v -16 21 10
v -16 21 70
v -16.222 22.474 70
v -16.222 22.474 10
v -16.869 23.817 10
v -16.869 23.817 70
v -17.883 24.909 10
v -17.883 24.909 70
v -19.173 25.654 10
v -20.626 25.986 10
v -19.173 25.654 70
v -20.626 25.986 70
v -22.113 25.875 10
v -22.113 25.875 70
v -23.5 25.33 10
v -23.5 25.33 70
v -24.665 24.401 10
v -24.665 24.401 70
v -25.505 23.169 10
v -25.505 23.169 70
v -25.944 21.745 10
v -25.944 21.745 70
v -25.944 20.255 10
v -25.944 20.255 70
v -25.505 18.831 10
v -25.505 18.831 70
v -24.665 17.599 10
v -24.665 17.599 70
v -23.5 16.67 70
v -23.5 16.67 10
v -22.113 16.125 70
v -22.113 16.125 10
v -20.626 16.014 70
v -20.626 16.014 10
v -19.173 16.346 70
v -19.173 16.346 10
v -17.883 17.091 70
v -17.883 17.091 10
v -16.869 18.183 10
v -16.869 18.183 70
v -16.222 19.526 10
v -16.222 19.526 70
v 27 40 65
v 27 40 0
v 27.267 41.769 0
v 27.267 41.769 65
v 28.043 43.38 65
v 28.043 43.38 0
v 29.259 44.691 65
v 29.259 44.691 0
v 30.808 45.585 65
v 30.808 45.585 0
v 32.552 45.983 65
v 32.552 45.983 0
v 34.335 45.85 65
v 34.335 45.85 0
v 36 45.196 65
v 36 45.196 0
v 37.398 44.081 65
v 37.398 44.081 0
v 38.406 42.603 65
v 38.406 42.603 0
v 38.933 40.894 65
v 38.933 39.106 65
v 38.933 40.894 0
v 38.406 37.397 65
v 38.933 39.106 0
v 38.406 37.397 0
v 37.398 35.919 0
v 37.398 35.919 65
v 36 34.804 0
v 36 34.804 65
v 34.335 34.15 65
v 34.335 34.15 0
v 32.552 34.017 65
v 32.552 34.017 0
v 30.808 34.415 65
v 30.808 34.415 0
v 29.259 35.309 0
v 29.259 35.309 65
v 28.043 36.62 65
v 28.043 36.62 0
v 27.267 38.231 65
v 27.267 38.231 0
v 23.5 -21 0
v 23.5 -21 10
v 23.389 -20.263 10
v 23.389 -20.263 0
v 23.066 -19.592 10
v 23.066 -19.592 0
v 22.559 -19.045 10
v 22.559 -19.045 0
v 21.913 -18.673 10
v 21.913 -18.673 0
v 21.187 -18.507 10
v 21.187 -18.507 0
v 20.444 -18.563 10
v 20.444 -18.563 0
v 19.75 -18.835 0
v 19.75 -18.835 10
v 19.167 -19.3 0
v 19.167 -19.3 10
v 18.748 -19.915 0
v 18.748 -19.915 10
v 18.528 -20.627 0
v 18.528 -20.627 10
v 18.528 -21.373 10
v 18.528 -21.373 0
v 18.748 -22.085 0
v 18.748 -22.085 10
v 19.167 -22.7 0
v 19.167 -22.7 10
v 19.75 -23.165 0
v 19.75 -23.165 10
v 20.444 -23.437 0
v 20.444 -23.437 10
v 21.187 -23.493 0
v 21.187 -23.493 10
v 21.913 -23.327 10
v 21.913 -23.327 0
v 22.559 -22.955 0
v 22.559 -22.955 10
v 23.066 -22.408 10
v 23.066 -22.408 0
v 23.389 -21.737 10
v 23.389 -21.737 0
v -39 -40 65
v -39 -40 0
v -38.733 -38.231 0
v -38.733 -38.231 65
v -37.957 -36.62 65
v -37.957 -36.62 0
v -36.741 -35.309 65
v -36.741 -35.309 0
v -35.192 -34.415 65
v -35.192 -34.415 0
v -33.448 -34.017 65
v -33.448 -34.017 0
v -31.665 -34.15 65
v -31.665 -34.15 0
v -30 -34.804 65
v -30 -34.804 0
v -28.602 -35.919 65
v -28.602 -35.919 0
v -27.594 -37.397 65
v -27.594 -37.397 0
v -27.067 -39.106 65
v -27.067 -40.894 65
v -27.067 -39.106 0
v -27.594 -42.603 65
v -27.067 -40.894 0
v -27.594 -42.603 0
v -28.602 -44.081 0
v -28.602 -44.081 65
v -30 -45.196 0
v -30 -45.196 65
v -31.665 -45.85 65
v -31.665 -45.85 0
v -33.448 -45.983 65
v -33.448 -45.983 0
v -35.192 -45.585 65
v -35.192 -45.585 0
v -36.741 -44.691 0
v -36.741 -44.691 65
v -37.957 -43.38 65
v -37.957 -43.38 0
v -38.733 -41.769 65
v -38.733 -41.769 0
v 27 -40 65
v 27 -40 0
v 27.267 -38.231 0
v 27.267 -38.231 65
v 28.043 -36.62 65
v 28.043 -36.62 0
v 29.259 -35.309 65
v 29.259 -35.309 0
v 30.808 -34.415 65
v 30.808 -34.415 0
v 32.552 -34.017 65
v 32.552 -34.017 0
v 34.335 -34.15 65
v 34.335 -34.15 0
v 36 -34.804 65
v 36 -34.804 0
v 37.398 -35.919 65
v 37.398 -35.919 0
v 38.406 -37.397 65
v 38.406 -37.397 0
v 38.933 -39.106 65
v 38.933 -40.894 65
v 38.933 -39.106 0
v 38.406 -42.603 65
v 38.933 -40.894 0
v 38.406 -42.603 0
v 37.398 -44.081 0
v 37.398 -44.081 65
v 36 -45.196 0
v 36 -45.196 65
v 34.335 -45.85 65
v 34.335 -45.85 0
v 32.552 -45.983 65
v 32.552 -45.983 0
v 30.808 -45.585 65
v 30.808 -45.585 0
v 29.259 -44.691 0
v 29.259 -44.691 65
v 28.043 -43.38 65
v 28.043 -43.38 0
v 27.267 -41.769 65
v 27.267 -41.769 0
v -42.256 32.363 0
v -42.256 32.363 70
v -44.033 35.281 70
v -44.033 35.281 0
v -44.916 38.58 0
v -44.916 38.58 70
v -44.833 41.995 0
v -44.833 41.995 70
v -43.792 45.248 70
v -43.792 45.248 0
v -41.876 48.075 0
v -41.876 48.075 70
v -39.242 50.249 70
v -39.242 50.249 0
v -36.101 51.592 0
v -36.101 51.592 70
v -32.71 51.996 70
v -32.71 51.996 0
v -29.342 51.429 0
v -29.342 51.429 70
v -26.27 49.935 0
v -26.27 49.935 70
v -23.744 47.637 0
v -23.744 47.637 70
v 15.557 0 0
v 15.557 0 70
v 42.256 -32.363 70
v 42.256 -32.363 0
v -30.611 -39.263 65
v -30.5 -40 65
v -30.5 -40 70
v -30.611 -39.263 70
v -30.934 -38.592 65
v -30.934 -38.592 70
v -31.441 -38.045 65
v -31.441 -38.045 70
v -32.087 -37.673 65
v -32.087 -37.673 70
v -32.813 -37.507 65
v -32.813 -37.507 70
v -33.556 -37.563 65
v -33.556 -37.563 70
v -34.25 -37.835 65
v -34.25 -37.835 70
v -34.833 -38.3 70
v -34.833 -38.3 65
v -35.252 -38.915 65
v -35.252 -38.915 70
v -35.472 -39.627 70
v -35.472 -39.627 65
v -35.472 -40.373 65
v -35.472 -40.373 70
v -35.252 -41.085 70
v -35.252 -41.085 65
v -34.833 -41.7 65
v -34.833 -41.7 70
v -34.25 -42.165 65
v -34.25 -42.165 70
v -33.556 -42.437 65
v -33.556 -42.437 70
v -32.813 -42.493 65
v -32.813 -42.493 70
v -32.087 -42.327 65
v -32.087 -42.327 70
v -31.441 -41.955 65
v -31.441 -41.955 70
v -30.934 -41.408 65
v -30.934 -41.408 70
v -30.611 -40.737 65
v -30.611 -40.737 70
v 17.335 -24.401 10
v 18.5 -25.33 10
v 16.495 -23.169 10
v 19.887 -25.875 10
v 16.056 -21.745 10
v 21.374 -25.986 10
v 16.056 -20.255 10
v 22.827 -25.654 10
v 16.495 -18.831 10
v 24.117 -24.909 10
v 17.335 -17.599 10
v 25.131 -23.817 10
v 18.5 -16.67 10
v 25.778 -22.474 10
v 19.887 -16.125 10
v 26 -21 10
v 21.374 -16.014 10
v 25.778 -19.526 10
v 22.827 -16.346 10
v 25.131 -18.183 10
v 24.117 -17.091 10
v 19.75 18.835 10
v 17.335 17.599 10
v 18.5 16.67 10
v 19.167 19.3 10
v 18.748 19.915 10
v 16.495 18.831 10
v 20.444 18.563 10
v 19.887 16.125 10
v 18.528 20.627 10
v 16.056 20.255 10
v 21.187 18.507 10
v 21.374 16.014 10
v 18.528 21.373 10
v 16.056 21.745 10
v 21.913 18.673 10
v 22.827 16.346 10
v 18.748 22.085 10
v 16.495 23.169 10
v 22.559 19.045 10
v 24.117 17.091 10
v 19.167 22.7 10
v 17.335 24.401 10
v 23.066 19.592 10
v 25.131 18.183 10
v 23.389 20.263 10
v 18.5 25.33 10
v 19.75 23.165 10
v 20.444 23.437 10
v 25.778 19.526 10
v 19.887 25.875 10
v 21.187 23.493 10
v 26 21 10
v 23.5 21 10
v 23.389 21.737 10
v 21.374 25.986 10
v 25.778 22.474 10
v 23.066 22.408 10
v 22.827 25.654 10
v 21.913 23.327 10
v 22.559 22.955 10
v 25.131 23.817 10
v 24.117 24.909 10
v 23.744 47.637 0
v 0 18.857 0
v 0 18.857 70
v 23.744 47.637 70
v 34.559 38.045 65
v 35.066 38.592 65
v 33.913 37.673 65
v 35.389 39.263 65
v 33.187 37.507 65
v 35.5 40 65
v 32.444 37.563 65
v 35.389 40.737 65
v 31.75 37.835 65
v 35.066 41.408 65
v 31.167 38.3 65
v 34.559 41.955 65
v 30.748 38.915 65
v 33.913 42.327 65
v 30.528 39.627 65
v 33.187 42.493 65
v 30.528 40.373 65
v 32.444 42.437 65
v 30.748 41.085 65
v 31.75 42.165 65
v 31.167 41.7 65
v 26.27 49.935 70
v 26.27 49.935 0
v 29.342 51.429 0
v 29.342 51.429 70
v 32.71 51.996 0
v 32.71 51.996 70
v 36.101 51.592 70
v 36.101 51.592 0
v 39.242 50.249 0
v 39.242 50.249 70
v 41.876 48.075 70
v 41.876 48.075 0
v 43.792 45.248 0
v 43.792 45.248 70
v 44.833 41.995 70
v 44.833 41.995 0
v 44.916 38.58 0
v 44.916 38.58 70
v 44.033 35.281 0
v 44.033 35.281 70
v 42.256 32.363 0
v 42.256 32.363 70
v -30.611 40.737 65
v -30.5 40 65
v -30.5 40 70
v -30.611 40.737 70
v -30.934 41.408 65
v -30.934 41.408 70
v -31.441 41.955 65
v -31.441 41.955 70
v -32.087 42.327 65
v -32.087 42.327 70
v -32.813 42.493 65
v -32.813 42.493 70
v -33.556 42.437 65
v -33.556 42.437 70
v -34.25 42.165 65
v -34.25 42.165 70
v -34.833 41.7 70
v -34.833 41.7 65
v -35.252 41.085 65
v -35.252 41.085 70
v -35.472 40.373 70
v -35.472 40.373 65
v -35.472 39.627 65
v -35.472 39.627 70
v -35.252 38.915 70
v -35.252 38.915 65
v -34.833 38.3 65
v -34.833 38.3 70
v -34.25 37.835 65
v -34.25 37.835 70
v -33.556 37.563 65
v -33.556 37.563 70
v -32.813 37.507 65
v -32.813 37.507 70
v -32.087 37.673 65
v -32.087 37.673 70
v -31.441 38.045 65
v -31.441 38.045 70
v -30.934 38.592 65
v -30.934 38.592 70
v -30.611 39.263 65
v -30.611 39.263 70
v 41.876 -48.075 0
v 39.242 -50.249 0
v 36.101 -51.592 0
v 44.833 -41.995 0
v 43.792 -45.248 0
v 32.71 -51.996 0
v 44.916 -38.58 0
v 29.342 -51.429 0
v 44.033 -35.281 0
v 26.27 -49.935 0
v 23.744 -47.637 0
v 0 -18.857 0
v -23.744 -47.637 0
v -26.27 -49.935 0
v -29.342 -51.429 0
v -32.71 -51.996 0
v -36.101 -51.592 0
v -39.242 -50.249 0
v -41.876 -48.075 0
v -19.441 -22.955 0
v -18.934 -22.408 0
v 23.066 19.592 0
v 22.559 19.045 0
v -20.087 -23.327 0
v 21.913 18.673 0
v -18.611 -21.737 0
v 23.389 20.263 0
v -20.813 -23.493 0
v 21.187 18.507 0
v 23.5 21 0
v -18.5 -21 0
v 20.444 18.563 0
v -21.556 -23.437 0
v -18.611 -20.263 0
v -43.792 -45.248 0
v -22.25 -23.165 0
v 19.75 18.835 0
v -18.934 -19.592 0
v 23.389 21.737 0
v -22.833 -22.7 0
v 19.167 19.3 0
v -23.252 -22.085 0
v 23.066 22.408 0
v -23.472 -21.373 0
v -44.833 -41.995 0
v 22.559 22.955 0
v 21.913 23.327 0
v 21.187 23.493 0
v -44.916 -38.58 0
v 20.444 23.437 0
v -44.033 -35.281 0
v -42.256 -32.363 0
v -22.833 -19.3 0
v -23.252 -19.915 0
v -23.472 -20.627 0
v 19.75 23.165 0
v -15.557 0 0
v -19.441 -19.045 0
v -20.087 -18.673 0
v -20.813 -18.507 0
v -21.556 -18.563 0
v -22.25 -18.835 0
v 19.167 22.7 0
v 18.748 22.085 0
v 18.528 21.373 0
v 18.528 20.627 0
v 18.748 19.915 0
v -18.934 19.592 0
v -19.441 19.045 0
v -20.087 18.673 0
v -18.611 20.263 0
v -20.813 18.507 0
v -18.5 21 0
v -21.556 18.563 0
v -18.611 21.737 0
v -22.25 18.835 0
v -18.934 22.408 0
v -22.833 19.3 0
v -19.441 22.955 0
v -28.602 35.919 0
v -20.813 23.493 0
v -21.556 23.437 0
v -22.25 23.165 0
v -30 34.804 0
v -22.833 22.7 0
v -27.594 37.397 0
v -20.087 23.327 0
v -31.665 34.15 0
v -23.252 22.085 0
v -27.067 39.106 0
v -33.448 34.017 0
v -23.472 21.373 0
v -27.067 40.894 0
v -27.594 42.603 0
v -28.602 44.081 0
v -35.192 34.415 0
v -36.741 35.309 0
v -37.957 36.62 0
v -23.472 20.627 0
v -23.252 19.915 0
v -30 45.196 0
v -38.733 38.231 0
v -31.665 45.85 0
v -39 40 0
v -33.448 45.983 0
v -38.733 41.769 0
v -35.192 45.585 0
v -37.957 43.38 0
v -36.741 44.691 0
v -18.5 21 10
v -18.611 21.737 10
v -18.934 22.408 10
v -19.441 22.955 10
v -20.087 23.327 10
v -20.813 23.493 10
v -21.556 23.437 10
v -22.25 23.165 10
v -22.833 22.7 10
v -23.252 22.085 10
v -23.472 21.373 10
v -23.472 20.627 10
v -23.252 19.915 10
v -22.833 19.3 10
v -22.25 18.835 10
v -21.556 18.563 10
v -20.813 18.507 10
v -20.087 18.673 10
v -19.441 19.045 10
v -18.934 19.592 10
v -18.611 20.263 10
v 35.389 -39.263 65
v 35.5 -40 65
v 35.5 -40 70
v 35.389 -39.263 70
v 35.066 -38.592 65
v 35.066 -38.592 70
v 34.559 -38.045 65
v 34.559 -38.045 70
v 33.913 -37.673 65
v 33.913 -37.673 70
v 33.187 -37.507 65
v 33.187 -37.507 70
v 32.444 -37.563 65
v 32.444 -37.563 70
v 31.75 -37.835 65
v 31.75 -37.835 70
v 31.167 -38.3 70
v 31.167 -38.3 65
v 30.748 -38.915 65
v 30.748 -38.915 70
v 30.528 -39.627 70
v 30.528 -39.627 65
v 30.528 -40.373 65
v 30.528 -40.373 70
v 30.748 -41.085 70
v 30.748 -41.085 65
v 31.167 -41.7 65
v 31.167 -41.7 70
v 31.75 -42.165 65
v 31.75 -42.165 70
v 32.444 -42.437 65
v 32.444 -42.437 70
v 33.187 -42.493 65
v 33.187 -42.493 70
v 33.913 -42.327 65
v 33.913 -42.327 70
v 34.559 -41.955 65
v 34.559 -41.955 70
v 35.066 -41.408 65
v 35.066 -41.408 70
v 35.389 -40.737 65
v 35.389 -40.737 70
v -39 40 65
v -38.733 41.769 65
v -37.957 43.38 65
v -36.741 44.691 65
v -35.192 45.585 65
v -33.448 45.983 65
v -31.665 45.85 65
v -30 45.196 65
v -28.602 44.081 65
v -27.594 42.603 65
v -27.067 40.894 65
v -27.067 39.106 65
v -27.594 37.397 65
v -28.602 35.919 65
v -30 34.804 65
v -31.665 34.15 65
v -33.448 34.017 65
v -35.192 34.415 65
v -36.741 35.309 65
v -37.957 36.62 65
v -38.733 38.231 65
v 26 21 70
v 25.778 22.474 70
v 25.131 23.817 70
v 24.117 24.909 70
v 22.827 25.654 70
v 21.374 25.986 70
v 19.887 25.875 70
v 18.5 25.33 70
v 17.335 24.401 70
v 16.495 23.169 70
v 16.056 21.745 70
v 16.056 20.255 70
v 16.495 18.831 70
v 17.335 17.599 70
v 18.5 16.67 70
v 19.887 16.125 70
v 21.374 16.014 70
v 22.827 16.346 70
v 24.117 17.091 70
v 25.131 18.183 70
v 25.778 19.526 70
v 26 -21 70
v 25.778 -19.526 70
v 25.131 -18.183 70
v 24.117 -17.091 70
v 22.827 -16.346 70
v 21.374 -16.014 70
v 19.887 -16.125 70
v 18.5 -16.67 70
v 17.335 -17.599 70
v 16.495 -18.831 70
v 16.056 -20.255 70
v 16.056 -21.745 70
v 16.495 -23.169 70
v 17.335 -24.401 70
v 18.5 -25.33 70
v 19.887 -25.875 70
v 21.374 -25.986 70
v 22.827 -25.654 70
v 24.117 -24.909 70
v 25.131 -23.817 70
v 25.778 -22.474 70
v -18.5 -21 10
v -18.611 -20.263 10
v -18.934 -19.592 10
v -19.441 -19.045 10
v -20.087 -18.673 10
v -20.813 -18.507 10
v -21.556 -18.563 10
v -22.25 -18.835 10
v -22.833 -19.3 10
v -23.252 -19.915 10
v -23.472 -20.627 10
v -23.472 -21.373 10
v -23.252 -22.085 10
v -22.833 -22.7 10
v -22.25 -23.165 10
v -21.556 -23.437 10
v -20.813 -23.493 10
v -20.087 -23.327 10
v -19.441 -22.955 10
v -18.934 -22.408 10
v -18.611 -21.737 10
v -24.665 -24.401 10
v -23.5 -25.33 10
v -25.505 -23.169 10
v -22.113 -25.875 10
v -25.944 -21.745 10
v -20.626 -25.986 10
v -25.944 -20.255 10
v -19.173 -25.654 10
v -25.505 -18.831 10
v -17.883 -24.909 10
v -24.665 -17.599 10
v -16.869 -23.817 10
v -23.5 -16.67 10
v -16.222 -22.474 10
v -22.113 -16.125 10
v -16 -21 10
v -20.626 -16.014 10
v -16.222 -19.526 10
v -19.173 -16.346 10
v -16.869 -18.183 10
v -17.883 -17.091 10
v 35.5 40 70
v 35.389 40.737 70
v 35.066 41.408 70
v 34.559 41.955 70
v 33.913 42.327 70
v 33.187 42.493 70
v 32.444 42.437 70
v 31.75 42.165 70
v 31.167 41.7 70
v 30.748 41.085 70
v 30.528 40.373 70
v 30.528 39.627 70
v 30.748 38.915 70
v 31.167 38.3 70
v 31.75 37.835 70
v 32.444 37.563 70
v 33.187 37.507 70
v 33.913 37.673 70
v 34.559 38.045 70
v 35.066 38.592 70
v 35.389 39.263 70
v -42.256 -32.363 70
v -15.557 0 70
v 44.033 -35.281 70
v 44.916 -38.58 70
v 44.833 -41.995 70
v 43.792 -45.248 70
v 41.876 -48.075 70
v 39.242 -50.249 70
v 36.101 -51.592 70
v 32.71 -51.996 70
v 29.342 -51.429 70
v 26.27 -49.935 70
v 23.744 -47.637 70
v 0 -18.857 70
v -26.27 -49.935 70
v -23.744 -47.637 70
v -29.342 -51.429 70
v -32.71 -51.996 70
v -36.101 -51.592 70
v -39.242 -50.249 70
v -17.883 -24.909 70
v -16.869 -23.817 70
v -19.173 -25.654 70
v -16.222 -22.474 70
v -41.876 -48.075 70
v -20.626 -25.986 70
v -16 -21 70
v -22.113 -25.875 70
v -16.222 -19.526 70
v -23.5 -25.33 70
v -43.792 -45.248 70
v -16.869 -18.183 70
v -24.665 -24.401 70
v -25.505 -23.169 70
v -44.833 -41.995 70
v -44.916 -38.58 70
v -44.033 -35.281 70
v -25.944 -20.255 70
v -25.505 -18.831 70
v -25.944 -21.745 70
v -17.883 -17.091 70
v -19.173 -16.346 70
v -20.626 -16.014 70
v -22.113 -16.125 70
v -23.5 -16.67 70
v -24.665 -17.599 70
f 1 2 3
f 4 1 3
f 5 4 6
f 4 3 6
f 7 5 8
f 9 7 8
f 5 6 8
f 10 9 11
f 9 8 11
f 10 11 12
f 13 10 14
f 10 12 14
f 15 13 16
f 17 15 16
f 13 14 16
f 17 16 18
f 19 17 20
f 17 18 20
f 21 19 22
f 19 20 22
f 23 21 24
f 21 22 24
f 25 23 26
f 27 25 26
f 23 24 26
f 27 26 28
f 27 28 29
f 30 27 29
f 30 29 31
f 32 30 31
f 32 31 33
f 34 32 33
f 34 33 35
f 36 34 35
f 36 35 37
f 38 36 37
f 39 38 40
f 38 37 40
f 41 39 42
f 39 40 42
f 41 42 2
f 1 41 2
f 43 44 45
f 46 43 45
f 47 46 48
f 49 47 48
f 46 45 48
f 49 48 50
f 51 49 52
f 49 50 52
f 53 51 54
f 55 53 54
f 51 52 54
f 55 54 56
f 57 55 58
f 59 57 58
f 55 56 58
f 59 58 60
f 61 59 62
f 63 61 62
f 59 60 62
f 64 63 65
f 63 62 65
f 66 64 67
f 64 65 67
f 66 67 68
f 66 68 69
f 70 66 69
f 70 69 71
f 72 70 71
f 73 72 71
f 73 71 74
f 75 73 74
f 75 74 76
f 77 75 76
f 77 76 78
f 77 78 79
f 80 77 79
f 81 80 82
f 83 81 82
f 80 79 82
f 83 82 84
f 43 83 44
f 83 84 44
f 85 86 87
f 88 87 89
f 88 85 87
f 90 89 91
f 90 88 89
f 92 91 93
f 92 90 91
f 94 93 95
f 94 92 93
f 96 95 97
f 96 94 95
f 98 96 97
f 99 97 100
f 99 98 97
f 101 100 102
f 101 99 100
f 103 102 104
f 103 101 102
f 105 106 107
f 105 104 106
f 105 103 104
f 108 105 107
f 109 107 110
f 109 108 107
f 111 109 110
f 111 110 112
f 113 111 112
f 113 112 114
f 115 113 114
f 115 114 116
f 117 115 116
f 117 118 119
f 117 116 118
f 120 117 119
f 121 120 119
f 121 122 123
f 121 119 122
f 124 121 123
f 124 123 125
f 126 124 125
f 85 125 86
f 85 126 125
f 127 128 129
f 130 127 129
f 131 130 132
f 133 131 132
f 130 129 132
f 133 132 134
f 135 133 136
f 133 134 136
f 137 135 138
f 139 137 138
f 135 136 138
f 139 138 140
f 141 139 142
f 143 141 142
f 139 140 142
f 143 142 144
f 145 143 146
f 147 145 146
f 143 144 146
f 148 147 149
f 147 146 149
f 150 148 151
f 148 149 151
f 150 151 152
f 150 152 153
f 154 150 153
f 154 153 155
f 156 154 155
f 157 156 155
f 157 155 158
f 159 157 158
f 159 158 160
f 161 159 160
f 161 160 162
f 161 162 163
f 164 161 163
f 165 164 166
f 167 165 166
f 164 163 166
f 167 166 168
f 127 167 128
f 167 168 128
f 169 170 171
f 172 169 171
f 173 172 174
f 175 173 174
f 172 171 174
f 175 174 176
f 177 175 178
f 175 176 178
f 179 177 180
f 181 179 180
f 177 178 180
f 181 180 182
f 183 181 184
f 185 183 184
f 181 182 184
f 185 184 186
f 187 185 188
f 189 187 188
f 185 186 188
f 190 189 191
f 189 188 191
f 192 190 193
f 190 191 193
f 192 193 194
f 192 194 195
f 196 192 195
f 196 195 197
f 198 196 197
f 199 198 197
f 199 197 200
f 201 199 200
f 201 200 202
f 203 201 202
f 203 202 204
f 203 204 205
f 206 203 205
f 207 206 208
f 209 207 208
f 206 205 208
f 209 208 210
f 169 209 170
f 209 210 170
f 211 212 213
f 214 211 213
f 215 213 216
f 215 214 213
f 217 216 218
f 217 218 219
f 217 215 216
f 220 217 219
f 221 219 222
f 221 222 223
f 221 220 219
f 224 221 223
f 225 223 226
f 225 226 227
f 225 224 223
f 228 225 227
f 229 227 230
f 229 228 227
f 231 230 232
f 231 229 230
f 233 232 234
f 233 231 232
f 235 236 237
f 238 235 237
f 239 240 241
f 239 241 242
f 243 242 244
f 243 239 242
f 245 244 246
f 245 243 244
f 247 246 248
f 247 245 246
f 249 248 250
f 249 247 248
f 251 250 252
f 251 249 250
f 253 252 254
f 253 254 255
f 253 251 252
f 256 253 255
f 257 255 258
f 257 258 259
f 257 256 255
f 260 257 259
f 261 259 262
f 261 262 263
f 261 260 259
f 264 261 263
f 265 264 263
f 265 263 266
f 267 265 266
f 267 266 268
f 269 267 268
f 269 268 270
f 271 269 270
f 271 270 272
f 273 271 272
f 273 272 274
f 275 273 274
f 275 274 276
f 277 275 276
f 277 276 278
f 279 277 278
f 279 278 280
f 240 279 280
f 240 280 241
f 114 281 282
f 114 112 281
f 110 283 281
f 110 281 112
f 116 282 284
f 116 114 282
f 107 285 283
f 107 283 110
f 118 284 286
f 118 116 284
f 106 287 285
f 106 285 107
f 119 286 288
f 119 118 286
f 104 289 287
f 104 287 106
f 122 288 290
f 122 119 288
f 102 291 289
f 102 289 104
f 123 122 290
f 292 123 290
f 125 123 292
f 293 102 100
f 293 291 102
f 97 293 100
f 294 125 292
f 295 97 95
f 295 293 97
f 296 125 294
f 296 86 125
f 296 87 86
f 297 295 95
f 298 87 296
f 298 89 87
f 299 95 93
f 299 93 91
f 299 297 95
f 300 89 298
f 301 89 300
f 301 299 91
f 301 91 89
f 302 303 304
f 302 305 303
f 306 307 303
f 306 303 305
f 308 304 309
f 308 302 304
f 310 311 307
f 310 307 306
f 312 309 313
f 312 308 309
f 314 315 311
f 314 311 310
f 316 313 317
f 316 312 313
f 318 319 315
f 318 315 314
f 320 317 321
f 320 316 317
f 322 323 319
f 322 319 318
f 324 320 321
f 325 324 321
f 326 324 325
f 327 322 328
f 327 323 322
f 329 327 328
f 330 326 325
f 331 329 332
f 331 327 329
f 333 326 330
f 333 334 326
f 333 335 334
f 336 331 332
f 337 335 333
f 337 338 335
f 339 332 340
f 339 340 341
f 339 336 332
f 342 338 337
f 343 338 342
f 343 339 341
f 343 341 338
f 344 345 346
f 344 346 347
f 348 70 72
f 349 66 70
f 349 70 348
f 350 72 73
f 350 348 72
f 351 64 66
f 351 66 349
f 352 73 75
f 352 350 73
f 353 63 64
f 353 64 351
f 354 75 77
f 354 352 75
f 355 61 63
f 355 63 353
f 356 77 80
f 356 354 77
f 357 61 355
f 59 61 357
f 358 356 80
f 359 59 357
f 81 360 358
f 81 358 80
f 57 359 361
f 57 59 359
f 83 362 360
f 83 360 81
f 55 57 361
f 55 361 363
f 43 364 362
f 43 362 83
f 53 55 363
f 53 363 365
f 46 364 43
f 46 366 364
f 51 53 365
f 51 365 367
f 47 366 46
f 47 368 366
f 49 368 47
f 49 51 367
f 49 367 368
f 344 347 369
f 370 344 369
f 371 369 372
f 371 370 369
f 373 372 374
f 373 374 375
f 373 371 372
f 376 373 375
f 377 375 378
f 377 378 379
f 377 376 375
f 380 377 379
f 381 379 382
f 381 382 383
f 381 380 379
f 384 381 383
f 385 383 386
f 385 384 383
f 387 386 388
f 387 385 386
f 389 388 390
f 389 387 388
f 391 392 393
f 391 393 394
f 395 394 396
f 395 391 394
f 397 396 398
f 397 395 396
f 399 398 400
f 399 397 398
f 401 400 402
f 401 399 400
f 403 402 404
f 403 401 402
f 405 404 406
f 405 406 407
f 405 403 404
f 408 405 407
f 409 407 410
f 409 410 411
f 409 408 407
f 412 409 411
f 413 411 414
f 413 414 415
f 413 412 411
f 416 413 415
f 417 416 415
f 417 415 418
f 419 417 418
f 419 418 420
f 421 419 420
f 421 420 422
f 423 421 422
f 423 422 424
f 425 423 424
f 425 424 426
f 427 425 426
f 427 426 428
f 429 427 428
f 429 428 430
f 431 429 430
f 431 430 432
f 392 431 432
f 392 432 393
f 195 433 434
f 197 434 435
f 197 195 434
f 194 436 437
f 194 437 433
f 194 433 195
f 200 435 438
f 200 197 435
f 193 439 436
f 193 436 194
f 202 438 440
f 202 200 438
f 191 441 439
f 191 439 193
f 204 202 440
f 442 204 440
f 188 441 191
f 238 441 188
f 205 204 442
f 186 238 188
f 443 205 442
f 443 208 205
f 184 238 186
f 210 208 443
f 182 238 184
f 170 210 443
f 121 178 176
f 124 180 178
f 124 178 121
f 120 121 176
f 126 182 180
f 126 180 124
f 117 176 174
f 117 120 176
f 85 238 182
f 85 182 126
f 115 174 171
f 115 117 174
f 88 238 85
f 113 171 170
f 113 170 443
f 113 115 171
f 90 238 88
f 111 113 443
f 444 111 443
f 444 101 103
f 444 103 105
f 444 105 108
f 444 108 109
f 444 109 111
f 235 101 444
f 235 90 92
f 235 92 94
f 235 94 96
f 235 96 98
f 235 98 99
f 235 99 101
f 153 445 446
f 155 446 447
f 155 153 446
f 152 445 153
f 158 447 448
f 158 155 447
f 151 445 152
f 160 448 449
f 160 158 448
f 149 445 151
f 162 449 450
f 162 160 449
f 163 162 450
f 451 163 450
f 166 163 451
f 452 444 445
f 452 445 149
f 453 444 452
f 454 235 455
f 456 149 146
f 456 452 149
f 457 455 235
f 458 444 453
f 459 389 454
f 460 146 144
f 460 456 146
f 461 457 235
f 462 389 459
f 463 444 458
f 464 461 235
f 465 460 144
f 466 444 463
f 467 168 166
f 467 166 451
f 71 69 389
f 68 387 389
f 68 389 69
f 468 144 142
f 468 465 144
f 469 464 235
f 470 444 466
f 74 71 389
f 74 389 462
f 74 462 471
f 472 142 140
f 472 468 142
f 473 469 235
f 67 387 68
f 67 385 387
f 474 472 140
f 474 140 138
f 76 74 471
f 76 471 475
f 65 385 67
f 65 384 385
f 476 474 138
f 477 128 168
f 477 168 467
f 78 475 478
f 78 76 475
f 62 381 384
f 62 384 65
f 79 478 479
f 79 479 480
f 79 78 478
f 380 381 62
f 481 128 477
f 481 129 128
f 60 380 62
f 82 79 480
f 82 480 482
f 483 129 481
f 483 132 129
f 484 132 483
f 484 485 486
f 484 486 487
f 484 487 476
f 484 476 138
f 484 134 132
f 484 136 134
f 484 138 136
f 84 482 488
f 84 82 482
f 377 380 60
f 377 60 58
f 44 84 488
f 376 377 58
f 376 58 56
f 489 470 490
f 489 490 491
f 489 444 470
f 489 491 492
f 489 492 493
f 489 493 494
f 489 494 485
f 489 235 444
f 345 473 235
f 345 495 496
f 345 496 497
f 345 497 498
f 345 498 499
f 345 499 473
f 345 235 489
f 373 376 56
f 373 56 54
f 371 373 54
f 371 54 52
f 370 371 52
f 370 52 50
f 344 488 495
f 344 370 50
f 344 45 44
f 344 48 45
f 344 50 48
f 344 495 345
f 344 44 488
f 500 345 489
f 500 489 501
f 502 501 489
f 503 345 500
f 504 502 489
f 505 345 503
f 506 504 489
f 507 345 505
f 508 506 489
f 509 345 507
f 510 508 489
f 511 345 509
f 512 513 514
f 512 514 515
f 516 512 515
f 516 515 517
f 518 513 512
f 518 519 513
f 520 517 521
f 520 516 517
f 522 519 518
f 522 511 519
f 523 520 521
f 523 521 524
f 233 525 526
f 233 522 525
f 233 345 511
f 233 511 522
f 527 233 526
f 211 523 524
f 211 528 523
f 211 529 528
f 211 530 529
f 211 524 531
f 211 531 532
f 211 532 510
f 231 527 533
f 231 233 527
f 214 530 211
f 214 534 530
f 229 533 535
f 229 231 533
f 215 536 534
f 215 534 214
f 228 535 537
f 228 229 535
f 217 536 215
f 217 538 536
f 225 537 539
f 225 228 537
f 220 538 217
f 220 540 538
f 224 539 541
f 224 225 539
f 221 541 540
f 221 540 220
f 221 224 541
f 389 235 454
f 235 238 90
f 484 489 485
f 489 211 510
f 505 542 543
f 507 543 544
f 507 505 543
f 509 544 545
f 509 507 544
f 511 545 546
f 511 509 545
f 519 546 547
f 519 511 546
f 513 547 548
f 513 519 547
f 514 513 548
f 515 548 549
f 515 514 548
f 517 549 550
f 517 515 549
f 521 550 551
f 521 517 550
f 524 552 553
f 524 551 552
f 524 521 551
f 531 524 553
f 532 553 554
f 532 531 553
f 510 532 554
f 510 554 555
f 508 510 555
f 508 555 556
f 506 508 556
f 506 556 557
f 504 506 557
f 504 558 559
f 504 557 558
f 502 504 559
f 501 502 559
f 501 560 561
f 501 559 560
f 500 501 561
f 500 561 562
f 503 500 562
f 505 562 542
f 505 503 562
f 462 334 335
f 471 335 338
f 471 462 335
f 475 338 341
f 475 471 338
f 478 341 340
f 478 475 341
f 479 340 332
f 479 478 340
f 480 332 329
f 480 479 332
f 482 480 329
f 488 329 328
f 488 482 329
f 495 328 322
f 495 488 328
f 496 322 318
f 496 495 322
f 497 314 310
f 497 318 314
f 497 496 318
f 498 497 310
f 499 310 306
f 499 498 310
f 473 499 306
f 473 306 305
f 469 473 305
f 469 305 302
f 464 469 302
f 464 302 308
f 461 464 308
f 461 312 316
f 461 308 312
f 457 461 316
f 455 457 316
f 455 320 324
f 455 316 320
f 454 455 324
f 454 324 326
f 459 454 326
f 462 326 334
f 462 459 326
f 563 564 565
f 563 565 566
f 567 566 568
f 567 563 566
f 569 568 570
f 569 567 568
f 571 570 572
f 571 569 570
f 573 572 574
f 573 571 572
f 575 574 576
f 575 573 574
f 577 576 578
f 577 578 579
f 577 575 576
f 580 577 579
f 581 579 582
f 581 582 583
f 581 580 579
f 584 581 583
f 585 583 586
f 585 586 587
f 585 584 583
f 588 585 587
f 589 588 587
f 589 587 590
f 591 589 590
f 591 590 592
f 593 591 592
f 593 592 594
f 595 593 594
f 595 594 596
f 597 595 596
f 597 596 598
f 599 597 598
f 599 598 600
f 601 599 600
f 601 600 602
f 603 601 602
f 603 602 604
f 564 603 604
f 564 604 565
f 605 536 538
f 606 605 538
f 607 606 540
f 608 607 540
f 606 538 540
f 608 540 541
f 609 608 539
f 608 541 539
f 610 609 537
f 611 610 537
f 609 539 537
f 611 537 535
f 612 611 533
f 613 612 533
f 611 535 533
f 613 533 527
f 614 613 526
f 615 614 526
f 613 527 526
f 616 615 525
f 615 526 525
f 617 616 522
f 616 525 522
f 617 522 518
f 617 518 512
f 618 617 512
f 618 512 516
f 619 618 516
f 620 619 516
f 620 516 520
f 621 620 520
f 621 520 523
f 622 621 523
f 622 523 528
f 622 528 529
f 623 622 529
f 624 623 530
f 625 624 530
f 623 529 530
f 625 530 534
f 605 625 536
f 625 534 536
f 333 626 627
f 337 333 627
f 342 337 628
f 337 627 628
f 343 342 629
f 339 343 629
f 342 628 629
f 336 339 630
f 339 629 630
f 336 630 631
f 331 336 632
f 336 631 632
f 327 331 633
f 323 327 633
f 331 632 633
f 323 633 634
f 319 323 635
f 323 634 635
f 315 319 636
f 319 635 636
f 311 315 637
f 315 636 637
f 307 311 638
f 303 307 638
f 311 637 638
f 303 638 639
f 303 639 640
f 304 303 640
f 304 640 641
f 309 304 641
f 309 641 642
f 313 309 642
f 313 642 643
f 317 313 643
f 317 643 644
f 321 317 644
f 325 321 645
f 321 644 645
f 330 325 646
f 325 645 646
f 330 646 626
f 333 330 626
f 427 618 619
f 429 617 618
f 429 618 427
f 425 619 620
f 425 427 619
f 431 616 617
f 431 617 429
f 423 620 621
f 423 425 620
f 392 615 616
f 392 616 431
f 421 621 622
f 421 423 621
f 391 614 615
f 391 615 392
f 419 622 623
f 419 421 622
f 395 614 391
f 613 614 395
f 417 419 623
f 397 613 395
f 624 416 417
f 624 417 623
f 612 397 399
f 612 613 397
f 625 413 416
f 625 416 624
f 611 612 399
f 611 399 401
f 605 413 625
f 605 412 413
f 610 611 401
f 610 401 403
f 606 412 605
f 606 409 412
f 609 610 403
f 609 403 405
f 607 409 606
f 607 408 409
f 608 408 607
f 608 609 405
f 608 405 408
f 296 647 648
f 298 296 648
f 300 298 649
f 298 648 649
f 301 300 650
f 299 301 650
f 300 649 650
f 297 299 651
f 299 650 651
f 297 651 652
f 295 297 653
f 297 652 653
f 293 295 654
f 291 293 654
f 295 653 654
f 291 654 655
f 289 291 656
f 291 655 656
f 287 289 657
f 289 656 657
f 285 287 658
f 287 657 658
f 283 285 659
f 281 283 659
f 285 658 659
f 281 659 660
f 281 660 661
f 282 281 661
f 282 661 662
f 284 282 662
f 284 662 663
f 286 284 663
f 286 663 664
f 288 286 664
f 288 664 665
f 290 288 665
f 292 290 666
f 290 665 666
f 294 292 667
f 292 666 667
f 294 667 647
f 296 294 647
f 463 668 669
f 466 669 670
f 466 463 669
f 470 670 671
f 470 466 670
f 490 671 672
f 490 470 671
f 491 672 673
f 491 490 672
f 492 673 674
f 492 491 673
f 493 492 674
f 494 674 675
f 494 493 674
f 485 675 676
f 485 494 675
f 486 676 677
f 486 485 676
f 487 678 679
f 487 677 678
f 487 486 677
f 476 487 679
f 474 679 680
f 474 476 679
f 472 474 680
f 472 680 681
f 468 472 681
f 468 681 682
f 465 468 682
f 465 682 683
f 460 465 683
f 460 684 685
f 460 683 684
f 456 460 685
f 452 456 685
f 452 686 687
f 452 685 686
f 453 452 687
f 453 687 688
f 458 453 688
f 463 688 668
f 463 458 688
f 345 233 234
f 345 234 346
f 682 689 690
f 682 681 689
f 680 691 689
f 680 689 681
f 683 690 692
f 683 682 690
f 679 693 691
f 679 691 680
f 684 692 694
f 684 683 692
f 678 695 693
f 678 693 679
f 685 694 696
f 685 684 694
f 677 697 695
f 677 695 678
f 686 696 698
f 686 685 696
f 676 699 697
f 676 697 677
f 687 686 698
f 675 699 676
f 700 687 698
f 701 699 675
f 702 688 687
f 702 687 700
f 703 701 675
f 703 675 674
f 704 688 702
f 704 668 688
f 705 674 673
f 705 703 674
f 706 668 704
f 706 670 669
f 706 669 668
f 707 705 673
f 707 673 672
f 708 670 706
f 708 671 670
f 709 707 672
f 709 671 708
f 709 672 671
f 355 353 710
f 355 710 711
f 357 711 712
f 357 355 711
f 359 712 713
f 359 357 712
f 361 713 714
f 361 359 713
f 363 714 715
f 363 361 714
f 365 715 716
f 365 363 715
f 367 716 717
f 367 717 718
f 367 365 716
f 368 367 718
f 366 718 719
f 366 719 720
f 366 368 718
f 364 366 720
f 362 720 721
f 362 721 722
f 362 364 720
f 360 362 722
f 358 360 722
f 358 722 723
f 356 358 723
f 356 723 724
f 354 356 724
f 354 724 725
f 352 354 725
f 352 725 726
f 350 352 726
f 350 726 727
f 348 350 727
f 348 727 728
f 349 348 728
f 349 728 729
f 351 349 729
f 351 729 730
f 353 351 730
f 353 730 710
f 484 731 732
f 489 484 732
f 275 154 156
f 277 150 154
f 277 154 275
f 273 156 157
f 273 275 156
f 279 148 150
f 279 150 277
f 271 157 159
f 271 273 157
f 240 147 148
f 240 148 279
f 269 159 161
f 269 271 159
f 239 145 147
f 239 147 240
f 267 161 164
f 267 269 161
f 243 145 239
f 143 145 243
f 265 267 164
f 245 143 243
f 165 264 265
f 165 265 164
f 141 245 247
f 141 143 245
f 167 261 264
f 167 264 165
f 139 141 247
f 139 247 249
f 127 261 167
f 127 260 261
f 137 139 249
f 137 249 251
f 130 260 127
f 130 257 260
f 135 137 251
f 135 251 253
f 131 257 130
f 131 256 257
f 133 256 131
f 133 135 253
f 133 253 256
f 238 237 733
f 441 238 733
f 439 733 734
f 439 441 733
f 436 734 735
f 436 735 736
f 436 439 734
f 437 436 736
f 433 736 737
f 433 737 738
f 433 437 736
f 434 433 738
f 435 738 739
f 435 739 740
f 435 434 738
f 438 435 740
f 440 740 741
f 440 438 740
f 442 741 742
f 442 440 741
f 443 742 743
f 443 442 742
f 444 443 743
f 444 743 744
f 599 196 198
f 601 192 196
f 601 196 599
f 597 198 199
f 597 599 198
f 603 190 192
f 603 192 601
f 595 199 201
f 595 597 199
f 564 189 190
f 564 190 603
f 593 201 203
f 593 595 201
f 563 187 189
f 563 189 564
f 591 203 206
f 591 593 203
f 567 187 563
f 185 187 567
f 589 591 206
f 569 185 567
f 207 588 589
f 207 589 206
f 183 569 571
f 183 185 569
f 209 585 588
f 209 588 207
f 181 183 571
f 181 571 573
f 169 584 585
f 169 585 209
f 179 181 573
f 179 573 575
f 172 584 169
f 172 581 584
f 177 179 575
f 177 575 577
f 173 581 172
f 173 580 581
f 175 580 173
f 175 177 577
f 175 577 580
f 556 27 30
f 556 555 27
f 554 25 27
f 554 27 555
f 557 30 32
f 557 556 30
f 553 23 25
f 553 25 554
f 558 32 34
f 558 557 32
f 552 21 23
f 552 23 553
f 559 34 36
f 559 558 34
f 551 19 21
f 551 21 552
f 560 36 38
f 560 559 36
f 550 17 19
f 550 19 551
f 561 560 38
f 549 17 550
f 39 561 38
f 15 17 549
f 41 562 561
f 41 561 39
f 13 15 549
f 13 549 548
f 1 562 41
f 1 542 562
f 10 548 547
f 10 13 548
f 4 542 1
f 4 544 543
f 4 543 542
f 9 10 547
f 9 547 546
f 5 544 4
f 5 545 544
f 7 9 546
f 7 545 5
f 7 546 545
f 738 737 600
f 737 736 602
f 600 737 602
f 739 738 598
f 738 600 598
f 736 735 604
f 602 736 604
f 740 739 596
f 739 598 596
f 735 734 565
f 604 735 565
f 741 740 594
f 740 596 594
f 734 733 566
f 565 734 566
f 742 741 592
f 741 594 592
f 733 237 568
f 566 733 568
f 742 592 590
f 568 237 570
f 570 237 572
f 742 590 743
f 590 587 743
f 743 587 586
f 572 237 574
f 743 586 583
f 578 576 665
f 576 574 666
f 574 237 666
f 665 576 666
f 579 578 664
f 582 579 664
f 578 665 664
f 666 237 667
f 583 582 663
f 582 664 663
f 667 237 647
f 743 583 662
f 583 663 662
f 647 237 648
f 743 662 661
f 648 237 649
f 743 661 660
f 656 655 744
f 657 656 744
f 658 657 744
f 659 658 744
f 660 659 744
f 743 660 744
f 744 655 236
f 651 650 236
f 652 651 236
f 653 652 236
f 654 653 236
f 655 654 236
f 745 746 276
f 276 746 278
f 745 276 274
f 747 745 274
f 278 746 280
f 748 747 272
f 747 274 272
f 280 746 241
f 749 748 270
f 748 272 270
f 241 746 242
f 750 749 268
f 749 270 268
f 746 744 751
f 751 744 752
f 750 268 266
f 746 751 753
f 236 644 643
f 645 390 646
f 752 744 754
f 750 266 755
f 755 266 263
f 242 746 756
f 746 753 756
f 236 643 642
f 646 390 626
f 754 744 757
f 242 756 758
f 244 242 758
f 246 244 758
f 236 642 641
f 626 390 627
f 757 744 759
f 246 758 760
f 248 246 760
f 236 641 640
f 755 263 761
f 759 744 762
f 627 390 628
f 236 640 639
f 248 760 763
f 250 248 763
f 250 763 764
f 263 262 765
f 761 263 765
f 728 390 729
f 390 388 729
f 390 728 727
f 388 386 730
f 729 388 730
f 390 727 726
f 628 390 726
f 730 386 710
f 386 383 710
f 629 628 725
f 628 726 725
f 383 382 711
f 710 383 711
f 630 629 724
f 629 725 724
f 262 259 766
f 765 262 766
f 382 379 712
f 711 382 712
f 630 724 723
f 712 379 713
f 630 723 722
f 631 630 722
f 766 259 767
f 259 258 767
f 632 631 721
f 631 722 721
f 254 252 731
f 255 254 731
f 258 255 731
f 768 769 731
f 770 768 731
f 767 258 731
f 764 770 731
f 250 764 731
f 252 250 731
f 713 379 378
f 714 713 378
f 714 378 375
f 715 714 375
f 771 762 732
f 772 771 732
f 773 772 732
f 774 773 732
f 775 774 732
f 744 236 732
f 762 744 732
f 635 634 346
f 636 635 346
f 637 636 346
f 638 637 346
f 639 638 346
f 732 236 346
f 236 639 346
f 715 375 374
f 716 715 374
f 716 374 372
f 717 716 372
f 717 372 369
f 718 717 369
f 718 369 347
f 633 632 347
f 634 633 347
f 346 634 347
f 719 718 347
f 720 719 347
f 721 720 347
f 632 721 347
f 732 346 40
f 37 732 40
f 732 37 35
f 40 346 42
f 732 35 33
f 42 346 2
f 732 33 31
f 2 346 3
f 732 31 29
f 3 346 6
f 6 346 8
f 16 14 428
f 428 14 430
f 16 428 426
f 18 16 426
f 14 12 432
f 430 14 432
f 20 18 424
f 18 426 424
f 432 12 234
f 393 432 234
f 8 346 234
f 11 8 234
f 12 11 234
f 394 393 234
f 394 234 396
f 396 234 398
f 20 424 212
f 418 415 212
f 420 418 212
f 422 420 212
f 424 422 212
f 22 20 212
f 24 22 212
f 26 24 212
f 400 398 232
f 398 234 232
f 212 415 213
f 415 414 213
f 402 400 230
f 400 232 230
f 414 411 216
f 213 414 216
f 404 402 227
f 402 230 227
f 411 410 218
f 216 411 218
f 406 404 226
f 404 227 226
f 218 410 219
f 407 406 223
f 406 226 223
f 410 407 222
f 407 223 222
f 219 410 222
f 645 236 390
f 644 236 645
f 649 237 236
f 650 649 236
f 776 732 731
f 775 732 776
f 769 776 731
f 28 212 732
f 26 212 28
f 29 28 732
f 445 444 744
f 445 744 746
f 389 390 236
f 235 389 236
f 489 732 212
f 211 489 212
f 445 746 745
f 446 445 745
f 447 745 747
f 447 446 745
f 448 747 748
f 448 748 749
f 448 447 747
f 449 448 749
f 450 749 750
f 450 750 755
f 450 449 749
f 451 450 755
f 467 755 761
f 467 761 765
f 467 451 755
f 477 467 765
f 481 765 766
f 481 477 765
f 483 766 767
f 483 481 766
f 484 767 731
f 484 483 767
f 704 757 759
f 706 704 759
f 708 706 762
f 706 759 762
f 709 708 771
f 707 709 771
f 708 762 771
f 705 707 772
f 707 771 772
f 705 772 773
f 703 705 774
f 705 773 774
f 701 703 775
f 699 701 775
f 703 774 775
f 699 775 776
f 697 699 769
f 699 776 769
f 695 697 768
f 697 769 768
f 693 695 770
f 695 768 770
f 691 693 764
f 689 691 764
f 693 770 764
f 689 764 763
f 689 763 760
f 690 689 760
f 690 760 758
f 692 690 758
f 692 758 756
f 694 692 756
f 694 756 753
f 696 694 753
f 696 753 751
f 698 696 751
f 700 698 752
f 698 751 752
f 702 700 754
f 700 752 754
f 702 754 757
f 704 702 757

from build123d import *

# Parameters (mm, degrees)
SKETCH1_R           = 2.5
BOSS_EXTRUDE1_DEPTH = 70
SKETCH2_R           = 5
CUT_EXTRUDE1_DEPTH  = 60
SKETCH3_R           = 6
CUT_EXTRUDE2_DEPTH  = 65


with BuildPart() as part:
    # Sketch1 → Boss-Extrude1 (new body)
    with BuildSketch(Plane.XY):
        with BuildLine():
            Line((42.256479342, 32.363404542), (15.556670595, 0))
            Line((15.556670595, 0), (42.256479342, -32.363404542))
            ThreePointArc((42.256479342, -32.363404542), (40.636595458, -49.256479342), (23.743520658, -47.636595458))
            Line((23.743520658, -47.636595458), (0, -18.856570418))
            Line((0, -18.856570418), (-23.743520658, -47.636595458))
            ThreePointArc((-23.743520658, -47.636595458), (-40.636595458, -49.256479342), (-42.256479342, -32.363404542))
            Line((-42.256479342, -32.363404542), (-15.556670595, 0))
            Line((-15.556670595, 0), (-42.256479342, 32.363404542))
            ThreePointArc((-42.256479342, 32.363404542), (-40.636595458, 49.256479342), (-23.743520658, 47.636595458))
            Line((-23.743520658, 47.636595458), (0, 18.856570418))
            Line((0, 18.856570418), (23.743520658, 47.636595458))
            ThreePointArc((23.743520658, 47.636595458), (40.636595458, 49.256479342), (42.256479342, 32.363404542))
        make_face()
        with Locations((-33, 40)):
            Circle(SKETCH1_R, mode=Mode.SUBTRACT)
        with Locations((33, 40)):
            Circle(SKETCH1_R, mode=Mode.SUBTRACT)
        with Locations((-21, 21)):
            Circle(SKETCH1_R, mode=Mode.SUBTRACT)
        with Locations((21, 21)):
            Circle(SKETCH1_R, mode=Mode.SUBTRACT)
        with Locations((21, -21)):
            Circle(SKETCH1_R, mode=Mode.SUBTRACT)
        with Locations((-21, -21)):
            Circle(SKETCH1_R, mode=Mode.SUBTRACT)
        with Locations((-33, -40)):
            Circle(SKETCH1_R, mode=Mode.SUBTRACT)
        with Locations((33, -40)):
            Circle(SKETCH1_R, mode=Mode.SUBTRACT)
    extrude(amount=BOSS_EXTRUDE1_DEPTH)

    # Sketch2 → Cut-Extrude1 (cut)
    with BuildSketch(Plane.XY.offset(70)):
        with Locations((-21, -21)):
            Circle(SKETCH2_R)
        with Locations((-21, 21)):
            Circle(SKETCH2_R)
        with Locations((21, 21)):
            Circle(SKETCH2_R)
        with Locations((21, -21)):
            Circle(SKETCH2_R)
    extrude(amount=-CUT_EXTRUDE1_DEPTH, mode=Mode.SUBTRACT)

    # Sketch3 → Cut-Extrude2 (cut)
    with BuildSketch(Plane(origin=(0, 0, 0), x_dir=(-1, 0, 0), z_dir=(0, 0, -1))):
        with Locations((33, 40)):
            Circle(SKETCH3_R)
        with Locations((33, -40)):
            Circle(SKETCH3_R)
        with Locations((-33, 40)):
            Circle(SKETCH3_R)
        with Locations((-33, -40)):
            Circle(SKETCH3_R)
    extrude(amount=-CUT_EXTRUDE2_DEPTH, mode=Mode.SUBTRACT)


solid = part.part
